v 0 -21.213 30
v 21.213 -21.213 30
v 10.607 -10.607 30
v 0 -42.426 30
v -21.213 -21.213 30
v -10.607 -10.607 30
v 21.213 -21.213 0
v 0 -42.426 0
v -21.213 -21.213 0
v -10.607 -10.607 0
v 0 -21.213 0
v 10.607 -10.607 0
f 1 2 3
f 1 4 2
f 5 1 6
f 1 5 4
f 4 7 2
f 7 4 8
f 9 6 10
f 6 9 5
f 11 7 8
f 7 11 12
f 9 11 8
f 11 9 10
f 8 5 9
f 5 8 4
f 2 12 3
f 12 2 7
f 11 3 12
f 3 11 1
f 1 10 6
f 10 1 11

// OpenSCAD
rotate([0,0,180])
rotate([0,-90,0]){
    difference(){
        rotate([-45,0,0]) {
            cube([30, 30, 30]);
        }
        scale([1,0.5,0.5]) {
            rotate([-45,0,0]) {
                cube([30, 30, 30]);
            }
        }
    }
}
